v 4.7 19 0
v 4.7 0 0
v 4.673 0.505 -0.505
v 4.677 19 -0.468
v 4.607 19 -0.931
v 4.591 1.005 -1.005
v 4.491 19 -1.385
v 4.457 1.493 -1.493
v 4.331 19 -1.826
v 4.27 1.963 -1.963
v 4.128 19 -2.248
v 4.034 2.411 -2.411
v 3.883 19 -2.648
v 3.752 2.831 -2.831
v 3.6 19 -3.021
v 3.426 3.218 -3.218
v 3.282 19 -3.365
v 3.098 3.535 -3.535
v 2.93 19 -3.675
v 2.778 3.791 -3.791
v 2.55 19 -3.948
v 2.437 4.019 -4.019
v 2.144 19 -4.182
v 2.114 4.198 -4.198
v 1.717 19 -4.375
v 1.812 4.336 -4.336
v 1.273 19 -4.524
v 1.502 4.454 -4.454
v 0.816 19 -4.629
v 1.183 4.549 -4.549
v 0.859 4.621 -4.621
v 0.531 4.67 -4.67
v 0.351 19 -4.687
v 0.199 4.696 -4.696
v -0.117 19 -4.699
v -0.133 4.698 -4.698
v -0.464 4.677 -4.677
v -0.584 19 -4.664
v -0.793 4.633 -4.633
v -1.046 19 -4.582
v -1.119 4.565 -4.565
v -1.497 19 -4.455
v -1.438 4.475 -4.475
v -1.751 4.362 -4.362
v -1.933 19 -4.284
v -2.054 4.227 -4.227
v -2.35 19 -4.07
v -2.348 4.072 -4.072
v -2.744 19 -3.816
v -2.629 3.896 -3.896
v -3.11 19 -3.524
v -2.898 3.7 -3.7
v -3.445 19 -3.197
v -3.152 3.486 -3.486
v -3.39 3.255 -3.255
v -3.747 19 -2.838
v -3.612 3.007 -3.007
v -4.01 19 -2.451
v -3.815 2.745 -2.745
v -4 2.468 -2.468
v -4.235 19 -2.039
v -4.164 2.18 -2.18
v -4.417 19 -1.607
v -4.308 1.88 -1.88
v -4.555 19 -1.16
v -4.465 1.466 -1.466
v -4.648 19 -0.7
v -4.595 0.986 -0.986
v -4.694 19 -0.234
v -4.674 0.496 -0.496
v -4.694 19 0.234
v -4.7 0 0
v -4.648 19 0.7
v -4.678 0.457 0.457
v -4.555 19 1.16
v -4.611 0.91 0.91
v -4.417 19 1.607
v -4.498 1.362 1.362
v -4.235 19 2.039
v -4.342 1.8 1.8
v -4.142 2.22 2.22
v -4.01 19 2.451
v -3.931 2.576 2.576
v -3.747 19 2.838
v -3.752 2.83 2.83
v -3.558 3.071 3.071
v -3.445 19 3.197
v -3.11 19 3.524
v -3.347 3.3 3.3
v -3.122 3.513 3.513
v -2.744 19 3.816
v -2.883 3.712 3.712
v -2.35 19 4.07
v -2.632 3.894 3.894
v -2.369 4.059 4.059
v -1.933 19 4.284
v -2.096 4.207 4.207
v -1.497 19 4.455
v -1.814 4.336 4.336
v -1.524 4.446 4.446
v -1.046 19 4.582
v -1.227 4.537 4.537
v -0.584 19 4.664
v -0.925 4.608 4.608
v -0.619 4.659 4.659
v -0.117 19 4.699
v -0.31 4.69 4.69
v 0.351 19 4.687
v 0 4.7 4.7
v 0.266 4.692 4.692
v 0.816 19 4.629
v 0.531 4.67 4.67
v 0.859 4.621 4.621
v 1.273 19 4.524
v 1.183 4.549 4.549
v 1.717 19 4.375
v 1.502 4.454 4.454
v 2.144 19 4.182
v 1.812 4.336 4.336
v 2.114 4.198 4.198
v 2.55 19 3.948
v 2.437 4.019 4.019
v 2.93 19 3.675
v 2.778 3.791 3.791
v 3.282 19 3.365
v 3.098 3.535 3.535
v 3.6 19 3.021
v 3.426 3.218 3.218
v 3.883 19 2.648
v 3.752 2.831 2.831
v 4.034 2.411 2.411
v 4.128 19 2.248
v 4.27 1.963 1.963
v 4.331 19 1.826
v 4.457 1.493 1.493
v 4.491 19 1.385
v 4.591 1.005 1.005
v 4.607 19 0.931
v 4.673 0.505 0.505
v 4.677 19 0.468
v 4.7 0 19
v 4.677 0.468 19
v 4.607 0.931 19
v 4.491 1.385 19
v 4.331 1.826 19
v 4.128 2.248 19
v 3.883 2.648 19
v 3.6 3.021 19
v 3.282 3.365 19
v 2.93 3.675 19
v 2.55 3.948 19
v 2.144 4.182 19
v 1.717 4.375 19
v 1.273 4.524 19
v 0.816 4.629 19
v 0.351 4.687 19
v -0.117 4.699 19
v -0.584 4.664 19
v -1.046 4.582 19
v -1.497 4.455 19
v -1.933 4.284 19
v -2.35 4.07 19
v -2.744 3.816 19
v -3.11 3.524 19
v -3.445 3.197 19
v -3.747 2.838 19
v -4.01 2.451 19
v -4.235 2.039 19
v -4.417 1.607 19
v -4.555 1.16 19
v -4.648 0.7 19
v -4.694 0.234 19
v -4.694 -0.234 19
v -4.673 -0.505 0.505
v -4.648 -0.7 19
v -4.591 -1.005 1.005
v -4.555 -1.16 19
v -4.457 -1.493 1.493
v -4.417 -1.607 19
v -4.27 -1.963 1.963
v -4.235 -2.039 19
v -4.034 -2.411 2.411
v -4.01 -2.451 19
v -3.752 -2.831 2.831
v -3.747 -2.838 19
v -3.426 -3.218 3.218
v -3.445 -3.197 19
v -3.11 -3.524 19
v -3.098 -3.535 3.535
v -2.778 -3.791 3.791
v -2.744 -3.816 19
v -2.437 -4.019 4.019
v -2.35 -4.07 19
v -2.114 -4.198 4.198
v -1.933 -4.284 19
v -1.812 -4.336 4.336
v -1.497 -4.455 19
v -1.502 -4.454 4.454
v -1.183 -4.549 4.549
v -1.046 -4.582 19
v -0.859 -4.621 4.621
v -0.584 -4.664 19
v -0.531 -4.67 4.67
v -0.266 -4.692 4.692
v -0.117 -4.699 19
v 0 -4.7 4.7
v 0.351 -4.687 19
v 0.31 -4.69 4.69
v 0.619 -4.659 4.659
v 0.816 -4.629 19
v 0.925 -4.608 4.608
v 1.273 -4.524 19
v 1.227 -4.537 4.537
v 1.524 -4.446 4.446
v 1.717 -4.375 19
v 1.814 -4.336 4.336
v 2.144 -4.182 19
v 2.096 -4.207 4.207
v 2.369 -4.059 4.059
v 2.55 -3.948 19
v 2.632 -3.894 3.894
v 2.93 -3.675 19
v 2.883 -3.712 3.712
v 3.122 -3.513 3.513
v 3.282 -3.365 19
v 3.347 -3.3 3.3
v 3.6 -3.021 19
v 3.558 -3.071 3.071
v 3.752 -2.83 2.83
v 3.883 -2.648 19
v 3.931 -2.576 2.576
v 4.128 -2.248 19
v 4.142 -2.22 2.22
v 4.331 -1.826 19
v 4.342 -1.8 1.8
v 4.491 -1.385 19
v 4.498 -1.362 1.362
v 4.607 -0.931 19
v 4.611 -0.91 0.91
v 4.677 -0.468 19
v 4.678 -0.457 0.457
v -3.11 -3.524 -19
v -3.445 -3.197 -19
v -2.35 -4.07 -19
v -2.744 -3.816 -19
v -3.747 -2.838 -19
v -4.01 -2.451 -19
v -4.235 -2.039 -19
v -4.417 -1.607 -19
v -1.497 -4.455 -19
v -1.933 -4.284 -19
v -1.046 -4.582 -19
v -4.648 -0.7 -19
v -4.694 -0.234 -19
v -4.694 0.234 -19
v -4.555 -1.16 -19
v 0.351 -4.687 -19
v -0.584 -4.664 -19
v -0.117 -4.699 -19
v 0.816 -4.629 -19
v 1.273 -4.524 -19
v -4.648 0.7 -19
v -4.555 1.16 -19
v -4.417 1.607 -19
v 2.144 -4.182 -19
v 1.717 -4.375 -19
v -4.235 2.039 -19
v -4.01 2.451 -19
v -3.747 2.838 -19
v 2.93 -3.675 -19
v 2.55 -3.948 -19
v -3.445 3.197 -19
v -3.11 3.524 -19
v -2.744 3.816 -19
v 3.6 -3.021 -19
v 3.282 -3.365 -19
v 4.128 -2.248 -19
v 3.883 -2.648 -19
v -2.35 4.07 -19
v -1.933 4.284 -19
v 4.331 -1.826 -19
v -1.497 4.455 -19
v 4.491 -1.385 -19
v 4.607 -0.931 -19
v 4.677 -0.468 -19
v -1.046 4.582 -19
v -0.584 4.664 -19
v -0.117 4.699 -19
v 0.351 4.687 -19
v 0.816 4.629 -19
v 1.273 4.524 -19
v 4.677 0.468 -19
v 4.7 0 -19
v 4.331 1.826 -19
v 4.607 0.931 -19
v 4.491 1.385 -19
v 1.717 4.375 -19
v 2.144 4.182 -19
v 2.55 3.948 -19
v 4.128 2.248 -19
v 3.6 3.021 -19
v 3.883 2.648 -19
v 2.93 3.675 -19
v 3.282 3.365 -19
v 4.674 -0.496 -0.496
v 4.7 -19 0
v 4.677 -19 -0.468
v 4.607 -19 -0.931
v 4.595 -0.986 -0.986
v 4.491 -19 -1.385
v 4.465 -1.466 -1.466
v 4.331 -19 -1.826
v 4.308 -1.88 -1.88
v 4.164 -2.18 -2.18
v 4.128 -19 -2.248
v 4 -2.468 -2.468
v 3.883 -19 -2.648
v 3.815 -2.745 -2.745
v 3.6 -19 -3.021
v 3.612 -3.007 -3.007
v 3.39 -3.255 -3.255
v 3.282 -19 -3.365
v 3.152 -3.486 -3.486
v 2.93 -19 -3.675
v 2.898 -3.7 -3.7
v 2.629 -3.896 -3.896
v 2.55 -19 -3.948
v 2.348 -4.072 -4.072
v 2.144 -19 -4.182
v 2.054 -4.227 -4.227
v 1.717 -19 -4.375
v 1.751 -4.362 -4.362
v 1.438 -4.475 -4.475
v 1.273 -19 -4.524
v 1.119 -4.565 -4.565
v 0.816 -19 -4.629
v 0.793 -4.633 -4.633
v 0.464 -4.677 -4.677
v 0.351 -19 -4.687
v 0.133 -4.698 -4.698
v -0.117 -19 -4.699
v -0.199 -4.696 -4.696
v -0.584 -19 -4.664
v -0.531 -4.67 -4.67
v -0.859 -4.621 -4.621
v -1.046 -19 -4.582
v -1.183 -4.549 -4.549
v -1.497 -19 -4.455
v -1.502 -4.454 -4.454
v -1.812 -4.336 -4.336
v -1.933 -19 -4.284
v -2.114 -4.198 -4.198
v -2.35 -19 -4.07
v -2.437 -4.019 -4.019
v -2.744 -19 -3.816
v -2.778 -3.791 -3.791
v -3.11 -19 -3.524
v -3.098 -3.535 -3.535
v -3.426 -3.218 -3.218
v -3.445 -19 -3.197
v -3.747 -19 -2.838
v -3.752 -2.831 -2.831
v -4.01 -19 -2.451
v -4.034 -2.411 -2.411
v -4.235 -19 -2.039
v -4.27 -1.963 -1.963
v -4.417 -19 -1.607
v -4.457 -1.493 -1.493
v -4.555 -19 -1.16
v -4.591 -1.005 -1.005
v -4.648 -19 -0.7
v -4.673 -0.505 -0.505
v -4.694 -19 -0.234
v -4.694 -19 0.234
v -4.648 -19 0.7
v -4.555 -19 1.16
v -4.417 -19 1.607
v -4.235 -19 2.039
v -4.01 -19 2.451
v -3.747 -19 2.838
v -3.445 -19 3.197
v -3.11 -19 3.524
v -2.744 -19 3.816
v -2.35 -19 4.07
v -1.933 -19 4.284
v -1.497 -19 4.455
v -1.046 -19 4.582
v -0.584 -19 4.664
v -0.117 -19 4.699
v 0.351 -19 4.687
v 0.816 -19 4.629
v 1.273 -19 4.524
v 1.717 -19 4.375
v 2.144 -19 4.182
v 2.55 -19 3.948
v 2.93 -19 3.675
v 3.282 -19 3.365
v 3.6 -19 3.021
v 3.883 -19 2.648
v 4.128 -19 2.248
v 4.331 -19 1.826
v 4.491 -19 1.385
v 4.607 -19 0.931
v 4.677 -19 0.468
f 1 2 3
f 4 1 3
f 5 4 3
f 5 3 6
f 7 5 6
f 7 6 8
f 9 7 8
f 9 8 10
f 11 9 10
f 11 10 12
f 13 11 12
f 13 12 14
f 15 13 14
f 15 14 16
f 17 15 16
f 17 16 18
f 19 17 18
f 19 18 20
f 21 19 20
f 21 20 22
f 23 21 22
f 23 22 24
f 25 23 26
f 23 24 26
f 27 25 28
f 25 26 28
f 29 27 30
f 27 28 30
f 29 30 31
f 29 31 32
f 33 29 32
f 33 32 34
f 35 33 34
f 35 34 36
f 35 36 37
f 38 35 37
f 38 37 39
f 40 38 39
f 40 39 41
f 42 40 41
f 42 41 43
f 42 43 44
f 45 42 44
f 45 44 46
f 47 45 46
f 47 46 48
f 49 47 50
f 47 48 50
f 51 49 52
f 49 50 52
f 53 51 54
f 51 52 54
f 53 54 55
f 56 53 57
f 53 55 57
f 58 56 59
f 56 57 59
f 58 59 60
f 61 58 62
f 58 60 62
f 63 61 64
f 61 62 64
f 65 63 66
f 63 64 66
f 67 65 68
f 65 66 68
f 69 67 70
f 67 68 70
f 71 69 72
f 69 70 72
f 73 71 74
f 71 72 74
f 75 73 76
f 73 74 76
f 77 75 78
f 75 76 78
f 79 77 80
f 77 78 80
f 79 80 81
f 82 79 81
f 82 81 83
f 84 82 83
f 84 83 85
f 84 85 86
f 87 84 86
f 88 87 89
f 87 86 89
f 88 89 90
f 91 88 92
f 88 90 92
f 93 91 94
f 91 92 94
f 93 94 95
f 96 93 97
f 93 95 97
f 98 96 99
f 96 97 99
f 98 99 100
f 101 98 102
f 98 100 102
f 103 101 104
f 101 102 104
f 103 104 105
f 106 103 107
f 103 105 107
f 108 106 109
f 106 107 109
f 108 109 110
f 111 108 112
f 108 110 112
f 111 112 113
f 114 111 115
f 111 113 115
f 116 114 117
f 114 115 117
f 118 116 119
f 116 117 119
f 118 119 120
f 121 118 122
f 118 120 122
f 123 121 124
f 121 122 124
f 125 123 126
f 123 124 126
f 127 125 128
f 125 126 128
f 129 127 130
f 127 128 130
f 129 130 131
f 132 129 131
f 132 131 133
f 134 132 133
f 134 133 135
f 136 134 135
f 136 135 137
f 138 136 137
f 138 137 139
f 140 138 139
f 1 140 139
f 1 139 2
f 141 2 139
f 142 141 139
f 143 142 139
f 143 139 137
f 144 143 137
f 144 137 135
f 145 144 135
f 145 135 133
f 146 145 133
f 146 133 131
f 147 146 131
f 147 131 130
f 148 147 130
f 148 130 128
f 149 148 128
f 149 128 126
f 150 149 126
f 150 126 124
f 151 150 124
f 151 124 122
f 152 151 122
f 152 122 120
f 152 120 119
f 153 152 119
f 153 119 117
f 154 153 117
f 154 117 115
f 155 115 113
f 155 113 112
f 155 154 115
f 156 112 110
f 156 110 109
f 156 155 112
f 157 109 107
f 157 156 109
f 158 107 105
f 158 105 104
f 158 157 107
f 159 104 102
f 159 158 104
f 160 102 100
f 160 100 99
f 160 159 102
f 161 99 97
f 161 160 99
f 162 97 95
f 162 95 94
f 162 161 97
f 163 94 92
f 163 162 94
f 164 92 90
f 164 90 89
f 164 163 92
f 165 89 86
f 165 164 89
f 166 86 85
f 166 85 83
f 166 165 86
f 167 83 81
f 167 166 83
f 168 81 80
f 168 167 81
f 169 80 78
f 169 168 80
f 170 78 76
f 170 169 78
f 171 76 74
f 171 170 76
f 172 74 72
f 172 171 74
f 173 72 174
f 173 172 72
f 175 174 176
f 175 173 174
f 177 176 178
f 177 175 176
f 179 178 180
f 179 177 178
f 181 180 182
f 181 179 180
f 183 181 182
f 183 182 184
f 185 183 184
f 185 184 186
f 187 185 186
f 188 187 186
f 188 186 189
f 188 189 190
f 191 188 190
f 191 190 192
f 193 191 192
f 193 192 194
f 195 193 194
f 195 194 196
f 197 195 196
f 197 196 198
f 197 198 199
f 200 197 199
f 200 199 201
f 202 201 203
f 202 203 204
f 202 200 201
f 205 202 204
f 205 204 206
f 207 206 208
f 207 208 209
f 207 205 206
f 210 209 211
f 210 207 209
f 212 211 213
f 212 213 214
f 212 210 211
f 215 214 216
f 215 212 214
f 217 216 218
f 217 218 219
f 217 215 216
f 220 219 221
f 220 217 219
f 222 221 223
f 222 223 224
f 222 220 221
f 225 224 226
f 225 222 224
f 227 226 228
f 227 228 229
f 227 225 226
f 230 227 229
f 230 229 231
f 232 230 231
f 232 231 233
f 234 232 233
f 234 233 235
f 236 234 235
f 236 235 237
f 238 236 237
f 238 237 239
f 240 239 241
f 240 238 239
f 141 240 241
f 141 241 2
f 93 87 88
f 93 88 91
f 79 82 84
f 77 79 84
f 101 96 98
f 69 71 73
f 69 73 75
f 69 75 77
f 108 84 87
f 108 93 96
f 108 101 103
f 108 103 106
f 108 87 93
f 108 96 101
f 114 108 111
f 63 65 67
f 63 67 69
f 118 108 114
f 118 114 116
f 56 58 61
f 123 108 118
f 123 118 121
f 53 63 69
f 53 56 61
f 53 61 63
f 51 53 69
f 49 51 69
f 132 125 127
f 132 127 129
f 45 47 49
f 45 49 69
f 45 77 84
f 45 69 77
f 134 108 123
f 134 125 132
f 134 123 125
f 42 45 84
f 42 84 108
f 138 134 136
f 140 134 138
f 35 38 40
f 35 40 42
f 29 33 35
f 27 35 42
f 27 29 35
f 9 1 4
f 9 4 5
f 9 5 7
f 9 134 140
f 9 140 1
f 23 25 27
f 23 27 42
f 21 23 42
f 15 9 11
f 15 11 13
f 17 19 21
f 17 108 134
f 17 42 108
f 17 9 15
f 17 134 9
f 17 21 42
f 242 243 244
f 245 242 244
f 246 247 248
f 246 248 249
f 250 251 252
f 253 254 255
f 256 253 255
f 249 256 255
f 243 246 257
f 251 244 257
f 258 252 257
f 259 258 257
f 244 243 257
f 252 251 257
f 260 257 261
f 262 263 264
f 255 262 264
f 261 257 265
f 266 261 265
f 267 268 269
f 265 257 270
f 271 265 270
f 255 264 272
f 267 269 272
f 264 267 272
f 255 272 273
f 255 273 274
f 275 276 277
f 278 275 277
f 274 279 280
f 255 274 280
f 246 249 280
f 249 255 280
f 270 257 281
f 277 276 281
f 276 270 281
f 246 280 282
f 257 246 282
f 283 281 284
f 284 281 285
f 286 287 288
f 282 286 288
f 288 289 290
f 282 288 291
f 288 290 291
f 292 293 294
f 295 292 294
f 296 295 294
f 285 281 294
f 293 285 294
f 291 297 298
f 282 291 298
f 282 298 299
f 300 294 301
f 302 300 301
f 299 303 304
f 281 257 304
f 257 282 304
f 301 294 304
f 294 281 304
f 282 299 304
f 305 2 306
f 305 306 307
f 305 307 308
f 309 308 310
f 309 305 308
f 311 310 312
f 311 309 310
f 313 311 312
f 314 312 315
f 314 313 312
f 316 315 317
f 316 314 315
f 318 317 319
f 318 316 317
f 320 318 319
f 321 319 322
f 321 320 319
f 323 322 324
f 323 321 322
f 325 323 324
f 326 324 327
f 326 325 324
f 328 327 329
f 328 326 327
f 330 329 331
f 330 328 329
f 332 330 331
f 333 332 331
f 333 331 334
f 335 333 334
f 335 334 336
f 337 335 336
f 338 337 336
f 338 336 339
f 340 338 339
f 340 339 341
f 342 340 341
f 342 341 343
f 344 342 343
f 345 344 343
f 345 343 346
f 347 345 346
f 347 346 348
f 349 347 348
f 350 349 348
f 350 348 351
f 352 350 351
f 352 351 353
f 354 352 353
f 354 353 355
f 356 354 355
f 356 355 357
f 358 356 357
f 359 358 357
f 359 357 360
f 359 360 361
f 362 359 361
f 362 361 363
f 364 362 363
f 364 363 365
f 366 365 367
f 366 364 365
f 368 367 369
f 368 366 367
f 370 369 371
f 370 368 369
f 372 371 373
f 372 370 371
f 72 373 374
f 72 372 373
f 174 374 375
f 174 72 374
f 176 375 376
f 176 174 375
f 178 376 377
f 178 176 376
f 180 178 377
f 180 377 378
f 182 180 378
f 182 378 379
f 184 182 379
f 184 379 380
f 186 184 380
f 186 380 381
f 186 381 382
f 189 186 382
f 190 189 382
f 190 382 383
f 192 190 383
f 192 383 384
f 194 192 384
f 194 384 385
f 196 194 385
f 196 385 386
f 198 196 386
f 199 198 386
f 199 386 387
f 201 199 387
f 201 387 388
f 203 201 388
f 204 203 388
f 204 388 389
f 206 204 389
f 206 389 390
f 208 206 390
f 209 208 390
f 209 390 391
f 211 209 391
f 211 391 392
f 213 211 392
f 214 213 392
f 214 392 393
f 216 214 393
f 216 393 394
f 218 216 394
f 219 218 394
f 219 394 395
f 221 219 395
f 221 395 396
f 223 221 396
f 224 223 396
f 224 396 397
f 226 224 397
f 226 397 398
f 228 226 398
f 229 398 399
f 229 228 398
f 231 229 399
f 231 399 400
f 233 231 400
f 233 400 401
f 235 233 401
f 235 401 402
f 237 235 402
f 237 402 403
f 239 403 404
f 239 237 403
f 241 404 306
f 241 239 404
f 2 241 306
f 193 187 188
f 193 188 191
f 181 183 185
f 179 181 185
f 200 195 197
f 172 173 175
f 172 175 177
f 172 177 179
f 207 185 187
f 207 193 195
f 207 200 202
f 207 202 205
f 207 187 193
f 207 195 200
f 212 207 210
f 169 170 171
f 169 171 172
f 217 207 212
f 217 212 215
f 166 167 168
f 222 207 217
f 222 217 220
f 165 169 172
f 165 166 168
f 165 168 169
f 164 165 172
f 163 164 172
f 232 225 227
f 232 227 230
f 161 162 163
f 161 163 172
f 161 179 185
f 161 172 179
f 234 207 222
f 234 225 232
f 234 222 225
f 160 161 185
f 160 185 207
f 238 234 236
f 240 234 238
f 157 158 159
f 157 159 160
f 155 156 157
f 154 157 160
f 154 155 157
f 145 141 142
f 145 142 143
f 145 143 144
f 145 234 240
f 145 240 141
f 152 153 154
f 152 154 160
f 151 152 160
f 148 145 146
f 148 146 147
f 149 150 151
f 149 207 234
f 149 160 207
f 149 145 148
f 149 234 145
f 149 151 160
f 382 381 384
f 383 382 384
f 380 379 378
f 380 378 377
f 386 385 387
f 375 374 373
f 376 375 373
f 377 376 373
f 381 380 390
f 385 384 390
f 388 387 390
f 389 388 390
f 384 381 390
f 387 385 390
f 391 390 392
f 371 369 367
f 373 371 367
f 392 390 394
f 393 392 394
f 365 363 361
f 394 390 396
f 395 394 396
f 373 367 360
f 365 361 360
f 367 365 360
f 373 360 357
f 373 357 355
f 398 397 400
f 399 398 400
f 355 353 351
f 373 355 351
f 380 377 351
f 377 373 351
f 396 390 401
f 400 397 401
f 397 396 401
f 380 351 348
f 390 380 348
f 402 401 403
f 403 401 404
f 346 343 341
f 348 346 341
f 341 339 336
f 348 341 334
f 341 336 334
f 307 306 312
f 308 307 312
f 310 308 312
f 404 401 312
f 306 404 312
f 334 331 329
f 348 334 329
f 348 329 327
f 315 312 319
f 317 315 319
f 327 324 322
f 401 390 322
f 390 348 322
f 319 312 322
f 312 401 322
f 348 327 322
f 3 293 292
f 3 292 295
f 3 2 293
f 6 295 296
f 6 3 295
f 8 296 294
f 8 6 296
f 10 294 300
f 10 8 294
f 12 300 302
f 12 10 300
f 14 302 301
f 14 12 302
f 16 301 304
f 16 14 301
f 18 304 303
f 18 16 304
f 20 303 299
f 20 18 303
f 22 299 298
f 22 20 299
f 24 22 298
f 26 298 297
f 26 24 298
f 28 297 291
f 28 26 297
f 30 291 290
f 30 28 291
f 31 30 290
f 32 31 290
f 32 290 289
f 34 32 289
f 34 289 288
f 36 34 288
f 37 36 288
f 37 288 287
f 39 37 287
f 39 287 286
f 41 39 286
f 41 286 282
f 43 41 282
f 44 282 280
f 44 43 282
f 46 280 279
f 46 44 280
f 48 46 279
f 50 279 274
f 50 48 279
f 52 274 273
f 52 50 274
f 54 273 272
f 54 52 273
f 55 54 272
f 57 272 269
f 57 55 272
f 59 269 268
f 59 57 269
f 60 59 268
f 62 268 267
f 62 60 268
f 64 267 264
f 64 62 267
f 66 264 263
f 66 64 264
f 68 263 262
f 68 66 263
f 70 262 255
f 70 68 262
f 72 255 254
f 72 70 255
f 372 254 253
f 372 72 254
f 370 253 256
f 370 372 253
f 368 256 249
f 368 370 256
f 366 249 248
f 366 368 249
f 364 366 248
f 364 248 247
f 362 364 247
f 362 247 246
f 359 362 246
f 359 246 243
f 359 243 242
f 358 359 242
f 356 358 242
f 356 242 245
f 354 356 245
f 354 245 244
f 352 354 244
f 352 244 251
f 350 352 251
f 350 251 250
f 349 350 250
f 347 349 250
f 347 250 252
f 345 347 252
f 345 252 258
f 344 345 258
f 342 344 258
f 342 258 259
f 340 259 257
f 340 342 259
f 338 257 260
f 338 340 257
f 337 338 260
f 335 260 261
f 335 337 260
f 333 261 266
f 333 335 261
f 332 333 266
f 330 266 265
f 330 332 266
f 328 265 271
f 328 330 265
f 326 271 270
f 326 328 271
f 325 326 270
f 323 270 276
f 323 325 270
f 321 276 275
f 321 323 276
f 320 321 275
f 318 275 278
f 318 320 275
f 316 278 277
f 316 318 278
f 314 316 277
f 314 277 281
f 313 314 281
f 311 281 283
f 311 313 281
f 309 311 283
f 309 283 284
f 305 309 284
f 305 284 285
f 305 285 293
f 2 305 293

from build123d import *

# Parameters (mm, degrees)
BOSS_EXTRUDE1_DEPTH      = 19
BOSS_EXTRUDE1_DEPTH_BACK = 19
SKETCH1_R                = 4.7
BOSS_EXTRUDE2_DEPTH      = 19
BOSS_EXTRUDE2_DEPTH_BACK = 19
SKETCH2_R                = 4.7


with BuildPart() as part:
    # Sketch1 → Boss-Extrude1 (new, two sides: drawn at the far end of the back side and taken through both)
    with BuildSketch(Plane.XY.offset(-BOSS_EXTRUDE1_DEPTH_BACK)):
        Circle(SKETCH1_R)
    extrude(amount=BOSS_EXTRUDE1_DEPTH + BOSS_EXTRUDE1_DEPTH_BACK)

    # Sketch2 → Boss-Extrude2 (add, two sides: drawn at the far end of the back side and taken through both)
    with BuildSketch(Plane(origin=(0, 0, 0), x_dir=(1, 0, 0), z_dir=(0, 1, 0)).offset(-BOSS_EXTRUDE2_DEPTH_BACK)):
        Circle(SKETCH2_R)
    extrude(amount=BOSS_EXTRUDE2_DEPTH + BOSS_EXTRUDE2_DEPTH_BACK)


solid = part.part
